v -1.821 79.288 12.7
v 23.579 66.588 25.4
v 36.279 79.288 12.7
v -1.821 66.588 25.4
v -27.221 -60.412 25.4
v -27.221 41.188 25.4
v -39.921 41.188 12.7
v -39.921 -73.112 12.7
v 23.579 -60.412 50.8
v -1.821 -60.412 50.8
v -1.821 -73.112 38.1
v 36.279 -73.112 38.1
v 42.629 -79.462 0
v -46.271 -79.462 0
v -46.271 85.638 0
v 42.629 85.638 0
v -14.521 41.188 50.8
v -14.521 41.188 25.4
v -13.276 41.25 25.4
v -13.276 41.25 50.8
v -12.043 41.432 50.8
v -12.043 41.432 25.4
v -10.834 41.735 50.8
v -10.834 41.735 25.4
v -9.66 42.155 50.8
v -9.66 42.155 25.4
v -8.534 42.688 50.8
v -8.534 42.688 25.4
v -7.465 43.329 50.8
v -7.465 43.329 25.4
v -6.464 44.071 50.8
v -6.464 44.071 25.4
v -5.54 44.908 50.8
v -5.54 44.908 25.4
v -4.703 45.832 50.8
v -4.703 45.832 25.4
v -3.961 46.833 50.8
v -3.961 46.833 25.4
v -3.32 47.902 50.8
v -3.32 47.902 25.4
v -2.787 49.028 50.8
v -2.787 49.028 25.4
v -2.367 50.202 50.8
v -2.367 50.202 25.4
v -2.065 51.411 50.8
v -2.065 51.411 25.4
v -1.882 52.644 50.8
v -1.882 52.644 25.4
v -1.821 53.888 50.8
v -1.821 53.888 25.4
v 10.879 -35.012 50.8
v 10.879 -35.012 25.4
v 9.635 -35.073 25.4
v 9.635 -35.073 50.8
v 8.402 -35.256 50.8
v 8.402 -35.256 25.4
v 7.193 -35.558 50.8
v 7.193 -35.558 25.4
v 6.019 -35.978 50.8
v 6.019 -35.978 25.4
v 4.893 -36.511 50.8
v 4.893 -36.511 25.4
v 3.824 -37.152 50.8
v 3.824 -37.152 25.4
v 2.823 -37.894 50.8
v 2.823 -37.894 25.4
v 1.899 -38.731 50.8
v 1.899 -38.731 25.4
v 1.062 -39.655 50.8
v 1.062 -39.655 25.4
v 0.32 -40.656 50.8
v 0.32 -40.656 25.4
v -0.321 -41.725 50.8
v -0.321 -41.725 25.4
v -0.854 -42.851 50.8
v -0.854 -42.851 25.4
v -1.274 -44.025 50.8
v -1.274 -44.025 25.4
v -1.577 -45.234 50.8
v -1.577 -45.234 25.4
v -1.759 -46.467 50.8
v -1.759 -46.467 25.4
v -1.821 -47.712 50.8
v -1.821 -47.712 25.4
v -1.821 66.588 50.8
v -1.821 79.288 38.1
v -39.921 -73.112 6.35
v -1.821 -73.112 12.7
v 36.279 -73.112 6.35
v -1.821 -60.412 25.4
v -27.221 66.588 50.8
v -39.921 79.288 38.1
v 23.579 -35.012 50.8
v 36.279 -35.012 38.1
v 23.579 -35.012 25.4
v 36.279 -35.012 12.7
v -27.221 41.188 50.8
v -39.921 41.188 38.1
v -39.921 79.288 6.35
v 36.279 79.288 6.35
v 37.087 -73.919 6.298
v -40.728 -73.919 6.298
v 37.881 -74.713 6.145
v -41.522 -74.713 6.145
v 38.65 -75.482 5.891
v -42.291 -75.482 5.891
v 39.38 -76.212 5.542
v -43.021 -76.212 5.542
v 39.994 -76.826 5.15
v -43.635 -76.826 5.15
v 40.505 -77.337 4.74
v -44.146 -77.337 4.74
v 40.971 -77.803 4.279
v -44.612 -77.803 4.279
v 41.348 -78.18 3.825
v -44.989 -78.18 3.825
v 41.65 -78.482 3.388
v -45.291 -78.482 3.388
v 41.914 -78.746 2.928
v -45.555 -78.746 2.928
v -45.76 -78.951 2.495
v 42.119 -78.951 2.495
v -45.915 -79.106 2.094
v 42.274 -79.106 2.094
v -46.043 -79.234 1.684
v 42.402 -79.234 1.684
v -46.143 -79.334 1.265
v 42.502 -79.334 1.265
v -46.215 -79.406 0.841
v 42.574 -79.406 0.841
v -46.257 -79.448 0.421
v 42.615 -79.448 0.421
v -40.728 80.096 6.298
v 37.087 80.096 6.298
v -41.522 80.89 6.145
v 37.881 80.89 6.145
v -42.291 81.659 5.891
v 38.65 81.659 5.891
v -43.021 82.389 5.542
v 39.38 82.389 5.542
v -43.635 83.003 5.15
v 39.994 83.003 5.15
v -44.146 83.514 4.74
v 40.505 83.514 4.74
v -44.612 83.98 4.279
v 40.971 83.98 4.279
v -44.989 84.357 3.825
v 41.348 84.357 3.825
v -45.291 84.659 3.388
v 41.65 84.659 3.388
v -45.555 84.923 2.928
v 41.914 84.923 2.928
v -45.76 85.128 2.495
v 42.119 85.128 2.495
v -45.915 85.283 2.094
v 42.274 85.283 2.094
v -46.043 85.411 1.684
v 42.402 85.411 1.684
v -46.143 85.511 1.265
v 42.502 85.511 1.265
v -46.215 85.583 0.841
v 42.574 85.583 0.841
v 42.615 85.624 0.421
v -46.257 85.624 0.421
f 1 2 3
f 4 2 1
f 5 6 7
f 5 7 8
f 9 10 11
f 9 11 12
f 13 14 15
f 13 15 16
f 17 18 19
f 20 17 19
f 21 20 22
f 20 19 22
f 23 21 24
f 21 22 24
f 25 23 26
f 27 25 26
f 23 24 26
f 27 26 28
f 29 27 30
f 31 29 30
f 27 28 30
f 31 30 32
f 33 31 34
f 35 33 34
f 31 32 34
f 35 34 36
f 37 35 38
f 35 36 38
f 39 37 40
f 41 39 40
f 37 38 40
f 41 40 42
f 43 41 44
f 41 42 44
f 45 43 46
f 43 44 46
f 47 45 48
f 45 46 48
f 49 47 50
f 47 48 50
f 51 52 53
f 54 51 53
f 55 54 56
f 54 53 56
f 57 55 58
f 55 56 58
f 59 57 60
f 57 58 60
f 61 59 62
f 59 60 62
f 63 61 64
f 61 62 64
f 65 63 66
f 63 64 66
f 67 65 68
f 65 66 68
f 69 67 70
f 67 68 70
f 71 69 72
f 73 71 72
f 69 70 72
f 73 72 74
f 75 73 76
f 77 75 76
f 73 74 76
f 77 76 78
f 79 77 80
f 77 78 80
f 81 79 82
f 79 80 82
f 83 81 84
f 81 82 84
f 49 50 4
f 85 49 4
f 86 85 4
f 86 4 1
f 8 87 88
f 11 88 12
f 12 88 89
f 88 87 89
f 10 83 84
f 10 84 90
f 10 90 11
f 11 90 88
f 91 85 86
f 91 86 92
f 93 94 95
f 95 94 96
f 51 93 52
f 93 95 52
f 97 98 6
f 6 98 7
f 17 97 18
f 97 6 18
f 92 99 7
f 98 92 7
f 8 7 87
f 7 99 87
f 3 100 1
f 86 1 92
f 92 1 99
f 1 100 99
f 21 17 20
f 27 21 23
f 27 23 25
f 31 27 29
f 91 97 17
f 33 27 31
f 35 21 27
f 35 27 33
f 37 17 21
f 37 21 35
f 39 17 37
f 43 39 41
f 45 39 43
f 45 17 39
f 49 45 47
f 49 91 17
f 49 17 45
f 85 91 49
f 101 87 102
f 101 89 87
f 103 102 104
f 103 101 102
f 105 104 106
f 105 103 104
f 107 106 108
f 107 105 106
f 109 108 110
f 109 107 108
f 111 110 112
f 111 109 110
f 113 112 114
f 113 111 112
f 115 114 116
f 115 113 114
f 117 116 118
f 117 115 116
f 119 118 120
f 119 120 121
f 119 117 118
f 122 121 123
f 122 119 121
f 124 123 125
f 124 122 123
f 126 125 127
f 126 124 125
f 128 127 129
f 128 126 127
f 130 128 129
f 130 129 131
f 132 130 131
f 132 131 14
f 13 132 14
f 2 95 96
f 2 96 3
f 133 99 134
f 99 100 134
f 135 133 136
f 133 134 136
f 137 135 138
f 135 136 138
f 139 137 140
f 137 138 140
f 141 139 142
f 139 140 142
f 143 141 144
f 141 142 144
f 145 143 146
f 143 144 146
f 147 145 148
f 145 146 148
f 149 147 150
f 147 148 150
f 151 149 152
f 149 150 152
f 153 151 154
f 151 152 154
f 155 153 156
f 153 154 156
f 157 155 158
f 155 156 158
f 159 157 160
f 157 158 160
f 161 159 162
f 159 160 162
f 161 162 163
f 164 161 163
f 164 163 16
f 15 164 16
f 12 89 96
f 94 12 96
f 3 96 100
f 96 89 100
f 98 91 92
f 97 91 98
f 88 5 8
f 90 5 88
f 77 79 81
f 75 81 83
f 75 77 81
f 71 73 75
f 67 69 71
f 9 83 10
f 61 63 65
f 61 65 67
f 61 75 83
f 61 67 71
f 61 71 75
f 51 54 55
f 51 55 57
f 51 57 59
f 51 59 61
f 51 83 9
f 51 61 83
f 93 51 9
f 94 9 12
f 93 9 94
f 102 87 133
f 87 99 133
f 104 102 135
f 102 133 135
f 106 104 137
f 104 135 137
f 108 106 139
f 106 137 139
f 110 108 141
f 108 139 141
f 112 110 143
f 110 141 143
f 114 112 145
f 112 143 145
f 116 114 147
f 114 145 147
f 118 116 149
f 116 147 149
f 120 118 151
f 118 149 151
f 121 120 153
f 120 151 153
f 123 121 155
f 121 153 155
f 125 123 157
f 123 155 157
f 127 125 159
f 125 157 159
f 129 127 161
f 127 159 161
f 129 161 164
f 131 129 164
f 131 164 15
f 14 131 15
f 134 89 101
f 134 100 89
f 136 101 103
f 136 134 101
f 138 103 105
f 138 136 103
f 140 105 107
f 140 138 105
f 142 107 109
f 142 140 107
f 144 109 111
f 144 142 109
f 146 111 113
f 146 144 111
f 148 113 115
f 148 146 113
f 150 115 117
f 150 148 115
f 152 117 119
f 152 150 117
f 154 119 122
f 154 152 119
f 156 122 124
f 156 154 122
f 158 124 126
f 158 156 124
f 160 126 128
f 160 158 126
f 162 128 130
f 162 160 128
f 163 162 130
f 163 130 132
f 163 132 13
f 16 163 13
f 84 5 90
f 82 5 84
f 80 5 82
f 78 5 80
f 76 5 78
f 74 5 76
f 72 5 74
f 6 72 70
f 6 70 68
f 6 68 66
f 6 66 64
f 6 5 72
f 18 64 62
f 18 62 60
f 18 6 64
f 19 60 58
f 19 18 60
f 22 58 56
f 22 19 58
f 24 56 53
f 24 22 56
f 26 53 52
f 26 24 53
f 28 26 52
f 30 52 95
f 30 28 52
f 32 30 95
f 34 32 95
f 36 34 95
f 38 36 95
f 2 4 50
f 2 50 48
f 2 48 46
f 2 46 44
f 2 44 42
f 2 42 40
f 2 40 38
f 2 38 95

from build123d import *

# Parameters (mm, degrees)
F0_W     = 88.9
F0_H     = 165.1
F1_DEPTH = 6.35
F2_DEPTH = 25.4
F3_DEPTH = 50.8
F4_R     = 6.34999
F5_SIZE  = 12.7


# Not quite as in the source:
# - a fillet or chamfer is up to 0.001 mm smaller than in the source, because OpenCascade refuses the exact size


with BuildPart() as f1:
    # F0 (on Top) → F1 (new body)
    with BuildSketch(Plane.XY):
        with Locations((-1.8205753744, 3.0884221945)):
            Rectangle(F0_W, F0_H)
        Polygon((-39.9205753744, 41.1884221945), (-39.9205753744, 79.2884221945), (-1.8205753744, 79.2884221945), (36.2794246256, 79.2884221945), (36.2794246256, -35.0115778055), (36.2794246256, -73.1115778055), (-1.8205753744, -73.1115778055), (-39.9205753744, -73.1115778055), align=None, mode=Mode.SUBTRACT)
    extrude(amount=F1_DEPTH)

    # F0 (on Top) → F2 (join)
    with BuildSketch(Plane.XY):
        with BuildLine():
            Line((36.2794246256, 79.2884221945), (-1.8205753744, 79.2884221945))
            Line((-1.8205753744, 79.2884221945), (-1.8205753744, 53.8884221945))
            ThreePointArc((-1.8205753744, 53.8884221945), (-5.5403192533, 44.9081660734), (-14.5205753744, 41.1884221945))
            Line((-14.5205753744, 41.1884221945), (-39.9205753744, 41.1884221945))
            Line((-39.9205753744, 41.1884221945), (-39.9205753744, -73.1115778055))
            Line((-39.9205753744, -73.1115778055), (-1.8205753744, -73.1115778055))
            Line((-1.8205753744, -73.1115778055), (-1.8205753744, -47.7115778055))
            ThreePointArc((-1.8205753744, -47.7115778055), (1.8991685046, -38.7313216844), (10.8794246256, -35.0115778055))
            Line((10.8794246256, -35.0115778055), (36.2794246256, -35.0115778055))
            Line((36.2794246256, -35.0115778055), (36.2794246256, 79.2884221945))
        make_face()
    extrude(amount=F2_DEPTH)

    # F0 (on Top) → F3 (join)
    with BuildSketch(Plane.XY):
        with BuildLine():
            Line((-1.8205753744, 79.2884221945), (-39.9205753744, 79.2884221945))
            Line((-39.9205753744, 79.2884221945), (-39.9205753744, 41.1884221945))
            Line((-39.9205753744, 41.1884221945), (-14.5205753744, 41.1884221945))
            ThreePointArc((-14.5205753744, 41.1884221945), (-5.5403192533, 44.9081660734), (-1.8205753744, 53.8884221945))
            Line((-1.8205753744, 53.8884221945), (-1.8205753744, 79.2884221945))
        make_face()
        with BuildLine():
            Line((36.2794246256, -73.1115778055), (36.2794246256, -35.0115778055))
            Line((36.2794246256, -35.0115778055), (10.8794246256, -35.0115778055))
            ThreePointArc((10.8794246256, -35.0115778055), (1.8991685046, -38.7313216844), (-1.8205753744, -47.7115778055))
            Line((-1.8205753744, -47.7115778055), (-1.8205753744, -73.1115778055))
            Line((-1.8205753744, -73.1115778055), (36.2794246256, -73.1115778055))
        make_face()
    extrude(amount=F3_DEPTH)

    # F4 (radius 6.35 in the source; OpenCascade refuses exactly that, so slightly less here)
    f4_edges = [f1.edges().sort_by_distance(p)[0] for p in [
        (-46.270575, 3.088422, 6.35),
        (-1.820575, -79.461578, 6.35),
        (42.629425, 3.088422, 6.35),
        (-1.820575, 85.638422, 6.35),
    ]]
    fillet(f4_edges, radius=F4_R)

    # F5
    f5_edges = [f1.edges().sort_by_distance(p)[0] for p in [
        (17.229425, -73.111578, 50.8),
        (36.279425, -54.061578, 50.8),
        (-39.920575, 60.238422, 50.8),
        (-20.870575, 79.288422, 50.8),
        (-39.920575, -15.961578, 25.4),
        (-20.870575, -73.111578, 25.4),
        (36.279425, 22.138422, 25.4),
        (17.229425, 79.288422, 25.4),
    ]]
    chamfer(f5_edges, length=F5_SIZE)


solid = f1.part
